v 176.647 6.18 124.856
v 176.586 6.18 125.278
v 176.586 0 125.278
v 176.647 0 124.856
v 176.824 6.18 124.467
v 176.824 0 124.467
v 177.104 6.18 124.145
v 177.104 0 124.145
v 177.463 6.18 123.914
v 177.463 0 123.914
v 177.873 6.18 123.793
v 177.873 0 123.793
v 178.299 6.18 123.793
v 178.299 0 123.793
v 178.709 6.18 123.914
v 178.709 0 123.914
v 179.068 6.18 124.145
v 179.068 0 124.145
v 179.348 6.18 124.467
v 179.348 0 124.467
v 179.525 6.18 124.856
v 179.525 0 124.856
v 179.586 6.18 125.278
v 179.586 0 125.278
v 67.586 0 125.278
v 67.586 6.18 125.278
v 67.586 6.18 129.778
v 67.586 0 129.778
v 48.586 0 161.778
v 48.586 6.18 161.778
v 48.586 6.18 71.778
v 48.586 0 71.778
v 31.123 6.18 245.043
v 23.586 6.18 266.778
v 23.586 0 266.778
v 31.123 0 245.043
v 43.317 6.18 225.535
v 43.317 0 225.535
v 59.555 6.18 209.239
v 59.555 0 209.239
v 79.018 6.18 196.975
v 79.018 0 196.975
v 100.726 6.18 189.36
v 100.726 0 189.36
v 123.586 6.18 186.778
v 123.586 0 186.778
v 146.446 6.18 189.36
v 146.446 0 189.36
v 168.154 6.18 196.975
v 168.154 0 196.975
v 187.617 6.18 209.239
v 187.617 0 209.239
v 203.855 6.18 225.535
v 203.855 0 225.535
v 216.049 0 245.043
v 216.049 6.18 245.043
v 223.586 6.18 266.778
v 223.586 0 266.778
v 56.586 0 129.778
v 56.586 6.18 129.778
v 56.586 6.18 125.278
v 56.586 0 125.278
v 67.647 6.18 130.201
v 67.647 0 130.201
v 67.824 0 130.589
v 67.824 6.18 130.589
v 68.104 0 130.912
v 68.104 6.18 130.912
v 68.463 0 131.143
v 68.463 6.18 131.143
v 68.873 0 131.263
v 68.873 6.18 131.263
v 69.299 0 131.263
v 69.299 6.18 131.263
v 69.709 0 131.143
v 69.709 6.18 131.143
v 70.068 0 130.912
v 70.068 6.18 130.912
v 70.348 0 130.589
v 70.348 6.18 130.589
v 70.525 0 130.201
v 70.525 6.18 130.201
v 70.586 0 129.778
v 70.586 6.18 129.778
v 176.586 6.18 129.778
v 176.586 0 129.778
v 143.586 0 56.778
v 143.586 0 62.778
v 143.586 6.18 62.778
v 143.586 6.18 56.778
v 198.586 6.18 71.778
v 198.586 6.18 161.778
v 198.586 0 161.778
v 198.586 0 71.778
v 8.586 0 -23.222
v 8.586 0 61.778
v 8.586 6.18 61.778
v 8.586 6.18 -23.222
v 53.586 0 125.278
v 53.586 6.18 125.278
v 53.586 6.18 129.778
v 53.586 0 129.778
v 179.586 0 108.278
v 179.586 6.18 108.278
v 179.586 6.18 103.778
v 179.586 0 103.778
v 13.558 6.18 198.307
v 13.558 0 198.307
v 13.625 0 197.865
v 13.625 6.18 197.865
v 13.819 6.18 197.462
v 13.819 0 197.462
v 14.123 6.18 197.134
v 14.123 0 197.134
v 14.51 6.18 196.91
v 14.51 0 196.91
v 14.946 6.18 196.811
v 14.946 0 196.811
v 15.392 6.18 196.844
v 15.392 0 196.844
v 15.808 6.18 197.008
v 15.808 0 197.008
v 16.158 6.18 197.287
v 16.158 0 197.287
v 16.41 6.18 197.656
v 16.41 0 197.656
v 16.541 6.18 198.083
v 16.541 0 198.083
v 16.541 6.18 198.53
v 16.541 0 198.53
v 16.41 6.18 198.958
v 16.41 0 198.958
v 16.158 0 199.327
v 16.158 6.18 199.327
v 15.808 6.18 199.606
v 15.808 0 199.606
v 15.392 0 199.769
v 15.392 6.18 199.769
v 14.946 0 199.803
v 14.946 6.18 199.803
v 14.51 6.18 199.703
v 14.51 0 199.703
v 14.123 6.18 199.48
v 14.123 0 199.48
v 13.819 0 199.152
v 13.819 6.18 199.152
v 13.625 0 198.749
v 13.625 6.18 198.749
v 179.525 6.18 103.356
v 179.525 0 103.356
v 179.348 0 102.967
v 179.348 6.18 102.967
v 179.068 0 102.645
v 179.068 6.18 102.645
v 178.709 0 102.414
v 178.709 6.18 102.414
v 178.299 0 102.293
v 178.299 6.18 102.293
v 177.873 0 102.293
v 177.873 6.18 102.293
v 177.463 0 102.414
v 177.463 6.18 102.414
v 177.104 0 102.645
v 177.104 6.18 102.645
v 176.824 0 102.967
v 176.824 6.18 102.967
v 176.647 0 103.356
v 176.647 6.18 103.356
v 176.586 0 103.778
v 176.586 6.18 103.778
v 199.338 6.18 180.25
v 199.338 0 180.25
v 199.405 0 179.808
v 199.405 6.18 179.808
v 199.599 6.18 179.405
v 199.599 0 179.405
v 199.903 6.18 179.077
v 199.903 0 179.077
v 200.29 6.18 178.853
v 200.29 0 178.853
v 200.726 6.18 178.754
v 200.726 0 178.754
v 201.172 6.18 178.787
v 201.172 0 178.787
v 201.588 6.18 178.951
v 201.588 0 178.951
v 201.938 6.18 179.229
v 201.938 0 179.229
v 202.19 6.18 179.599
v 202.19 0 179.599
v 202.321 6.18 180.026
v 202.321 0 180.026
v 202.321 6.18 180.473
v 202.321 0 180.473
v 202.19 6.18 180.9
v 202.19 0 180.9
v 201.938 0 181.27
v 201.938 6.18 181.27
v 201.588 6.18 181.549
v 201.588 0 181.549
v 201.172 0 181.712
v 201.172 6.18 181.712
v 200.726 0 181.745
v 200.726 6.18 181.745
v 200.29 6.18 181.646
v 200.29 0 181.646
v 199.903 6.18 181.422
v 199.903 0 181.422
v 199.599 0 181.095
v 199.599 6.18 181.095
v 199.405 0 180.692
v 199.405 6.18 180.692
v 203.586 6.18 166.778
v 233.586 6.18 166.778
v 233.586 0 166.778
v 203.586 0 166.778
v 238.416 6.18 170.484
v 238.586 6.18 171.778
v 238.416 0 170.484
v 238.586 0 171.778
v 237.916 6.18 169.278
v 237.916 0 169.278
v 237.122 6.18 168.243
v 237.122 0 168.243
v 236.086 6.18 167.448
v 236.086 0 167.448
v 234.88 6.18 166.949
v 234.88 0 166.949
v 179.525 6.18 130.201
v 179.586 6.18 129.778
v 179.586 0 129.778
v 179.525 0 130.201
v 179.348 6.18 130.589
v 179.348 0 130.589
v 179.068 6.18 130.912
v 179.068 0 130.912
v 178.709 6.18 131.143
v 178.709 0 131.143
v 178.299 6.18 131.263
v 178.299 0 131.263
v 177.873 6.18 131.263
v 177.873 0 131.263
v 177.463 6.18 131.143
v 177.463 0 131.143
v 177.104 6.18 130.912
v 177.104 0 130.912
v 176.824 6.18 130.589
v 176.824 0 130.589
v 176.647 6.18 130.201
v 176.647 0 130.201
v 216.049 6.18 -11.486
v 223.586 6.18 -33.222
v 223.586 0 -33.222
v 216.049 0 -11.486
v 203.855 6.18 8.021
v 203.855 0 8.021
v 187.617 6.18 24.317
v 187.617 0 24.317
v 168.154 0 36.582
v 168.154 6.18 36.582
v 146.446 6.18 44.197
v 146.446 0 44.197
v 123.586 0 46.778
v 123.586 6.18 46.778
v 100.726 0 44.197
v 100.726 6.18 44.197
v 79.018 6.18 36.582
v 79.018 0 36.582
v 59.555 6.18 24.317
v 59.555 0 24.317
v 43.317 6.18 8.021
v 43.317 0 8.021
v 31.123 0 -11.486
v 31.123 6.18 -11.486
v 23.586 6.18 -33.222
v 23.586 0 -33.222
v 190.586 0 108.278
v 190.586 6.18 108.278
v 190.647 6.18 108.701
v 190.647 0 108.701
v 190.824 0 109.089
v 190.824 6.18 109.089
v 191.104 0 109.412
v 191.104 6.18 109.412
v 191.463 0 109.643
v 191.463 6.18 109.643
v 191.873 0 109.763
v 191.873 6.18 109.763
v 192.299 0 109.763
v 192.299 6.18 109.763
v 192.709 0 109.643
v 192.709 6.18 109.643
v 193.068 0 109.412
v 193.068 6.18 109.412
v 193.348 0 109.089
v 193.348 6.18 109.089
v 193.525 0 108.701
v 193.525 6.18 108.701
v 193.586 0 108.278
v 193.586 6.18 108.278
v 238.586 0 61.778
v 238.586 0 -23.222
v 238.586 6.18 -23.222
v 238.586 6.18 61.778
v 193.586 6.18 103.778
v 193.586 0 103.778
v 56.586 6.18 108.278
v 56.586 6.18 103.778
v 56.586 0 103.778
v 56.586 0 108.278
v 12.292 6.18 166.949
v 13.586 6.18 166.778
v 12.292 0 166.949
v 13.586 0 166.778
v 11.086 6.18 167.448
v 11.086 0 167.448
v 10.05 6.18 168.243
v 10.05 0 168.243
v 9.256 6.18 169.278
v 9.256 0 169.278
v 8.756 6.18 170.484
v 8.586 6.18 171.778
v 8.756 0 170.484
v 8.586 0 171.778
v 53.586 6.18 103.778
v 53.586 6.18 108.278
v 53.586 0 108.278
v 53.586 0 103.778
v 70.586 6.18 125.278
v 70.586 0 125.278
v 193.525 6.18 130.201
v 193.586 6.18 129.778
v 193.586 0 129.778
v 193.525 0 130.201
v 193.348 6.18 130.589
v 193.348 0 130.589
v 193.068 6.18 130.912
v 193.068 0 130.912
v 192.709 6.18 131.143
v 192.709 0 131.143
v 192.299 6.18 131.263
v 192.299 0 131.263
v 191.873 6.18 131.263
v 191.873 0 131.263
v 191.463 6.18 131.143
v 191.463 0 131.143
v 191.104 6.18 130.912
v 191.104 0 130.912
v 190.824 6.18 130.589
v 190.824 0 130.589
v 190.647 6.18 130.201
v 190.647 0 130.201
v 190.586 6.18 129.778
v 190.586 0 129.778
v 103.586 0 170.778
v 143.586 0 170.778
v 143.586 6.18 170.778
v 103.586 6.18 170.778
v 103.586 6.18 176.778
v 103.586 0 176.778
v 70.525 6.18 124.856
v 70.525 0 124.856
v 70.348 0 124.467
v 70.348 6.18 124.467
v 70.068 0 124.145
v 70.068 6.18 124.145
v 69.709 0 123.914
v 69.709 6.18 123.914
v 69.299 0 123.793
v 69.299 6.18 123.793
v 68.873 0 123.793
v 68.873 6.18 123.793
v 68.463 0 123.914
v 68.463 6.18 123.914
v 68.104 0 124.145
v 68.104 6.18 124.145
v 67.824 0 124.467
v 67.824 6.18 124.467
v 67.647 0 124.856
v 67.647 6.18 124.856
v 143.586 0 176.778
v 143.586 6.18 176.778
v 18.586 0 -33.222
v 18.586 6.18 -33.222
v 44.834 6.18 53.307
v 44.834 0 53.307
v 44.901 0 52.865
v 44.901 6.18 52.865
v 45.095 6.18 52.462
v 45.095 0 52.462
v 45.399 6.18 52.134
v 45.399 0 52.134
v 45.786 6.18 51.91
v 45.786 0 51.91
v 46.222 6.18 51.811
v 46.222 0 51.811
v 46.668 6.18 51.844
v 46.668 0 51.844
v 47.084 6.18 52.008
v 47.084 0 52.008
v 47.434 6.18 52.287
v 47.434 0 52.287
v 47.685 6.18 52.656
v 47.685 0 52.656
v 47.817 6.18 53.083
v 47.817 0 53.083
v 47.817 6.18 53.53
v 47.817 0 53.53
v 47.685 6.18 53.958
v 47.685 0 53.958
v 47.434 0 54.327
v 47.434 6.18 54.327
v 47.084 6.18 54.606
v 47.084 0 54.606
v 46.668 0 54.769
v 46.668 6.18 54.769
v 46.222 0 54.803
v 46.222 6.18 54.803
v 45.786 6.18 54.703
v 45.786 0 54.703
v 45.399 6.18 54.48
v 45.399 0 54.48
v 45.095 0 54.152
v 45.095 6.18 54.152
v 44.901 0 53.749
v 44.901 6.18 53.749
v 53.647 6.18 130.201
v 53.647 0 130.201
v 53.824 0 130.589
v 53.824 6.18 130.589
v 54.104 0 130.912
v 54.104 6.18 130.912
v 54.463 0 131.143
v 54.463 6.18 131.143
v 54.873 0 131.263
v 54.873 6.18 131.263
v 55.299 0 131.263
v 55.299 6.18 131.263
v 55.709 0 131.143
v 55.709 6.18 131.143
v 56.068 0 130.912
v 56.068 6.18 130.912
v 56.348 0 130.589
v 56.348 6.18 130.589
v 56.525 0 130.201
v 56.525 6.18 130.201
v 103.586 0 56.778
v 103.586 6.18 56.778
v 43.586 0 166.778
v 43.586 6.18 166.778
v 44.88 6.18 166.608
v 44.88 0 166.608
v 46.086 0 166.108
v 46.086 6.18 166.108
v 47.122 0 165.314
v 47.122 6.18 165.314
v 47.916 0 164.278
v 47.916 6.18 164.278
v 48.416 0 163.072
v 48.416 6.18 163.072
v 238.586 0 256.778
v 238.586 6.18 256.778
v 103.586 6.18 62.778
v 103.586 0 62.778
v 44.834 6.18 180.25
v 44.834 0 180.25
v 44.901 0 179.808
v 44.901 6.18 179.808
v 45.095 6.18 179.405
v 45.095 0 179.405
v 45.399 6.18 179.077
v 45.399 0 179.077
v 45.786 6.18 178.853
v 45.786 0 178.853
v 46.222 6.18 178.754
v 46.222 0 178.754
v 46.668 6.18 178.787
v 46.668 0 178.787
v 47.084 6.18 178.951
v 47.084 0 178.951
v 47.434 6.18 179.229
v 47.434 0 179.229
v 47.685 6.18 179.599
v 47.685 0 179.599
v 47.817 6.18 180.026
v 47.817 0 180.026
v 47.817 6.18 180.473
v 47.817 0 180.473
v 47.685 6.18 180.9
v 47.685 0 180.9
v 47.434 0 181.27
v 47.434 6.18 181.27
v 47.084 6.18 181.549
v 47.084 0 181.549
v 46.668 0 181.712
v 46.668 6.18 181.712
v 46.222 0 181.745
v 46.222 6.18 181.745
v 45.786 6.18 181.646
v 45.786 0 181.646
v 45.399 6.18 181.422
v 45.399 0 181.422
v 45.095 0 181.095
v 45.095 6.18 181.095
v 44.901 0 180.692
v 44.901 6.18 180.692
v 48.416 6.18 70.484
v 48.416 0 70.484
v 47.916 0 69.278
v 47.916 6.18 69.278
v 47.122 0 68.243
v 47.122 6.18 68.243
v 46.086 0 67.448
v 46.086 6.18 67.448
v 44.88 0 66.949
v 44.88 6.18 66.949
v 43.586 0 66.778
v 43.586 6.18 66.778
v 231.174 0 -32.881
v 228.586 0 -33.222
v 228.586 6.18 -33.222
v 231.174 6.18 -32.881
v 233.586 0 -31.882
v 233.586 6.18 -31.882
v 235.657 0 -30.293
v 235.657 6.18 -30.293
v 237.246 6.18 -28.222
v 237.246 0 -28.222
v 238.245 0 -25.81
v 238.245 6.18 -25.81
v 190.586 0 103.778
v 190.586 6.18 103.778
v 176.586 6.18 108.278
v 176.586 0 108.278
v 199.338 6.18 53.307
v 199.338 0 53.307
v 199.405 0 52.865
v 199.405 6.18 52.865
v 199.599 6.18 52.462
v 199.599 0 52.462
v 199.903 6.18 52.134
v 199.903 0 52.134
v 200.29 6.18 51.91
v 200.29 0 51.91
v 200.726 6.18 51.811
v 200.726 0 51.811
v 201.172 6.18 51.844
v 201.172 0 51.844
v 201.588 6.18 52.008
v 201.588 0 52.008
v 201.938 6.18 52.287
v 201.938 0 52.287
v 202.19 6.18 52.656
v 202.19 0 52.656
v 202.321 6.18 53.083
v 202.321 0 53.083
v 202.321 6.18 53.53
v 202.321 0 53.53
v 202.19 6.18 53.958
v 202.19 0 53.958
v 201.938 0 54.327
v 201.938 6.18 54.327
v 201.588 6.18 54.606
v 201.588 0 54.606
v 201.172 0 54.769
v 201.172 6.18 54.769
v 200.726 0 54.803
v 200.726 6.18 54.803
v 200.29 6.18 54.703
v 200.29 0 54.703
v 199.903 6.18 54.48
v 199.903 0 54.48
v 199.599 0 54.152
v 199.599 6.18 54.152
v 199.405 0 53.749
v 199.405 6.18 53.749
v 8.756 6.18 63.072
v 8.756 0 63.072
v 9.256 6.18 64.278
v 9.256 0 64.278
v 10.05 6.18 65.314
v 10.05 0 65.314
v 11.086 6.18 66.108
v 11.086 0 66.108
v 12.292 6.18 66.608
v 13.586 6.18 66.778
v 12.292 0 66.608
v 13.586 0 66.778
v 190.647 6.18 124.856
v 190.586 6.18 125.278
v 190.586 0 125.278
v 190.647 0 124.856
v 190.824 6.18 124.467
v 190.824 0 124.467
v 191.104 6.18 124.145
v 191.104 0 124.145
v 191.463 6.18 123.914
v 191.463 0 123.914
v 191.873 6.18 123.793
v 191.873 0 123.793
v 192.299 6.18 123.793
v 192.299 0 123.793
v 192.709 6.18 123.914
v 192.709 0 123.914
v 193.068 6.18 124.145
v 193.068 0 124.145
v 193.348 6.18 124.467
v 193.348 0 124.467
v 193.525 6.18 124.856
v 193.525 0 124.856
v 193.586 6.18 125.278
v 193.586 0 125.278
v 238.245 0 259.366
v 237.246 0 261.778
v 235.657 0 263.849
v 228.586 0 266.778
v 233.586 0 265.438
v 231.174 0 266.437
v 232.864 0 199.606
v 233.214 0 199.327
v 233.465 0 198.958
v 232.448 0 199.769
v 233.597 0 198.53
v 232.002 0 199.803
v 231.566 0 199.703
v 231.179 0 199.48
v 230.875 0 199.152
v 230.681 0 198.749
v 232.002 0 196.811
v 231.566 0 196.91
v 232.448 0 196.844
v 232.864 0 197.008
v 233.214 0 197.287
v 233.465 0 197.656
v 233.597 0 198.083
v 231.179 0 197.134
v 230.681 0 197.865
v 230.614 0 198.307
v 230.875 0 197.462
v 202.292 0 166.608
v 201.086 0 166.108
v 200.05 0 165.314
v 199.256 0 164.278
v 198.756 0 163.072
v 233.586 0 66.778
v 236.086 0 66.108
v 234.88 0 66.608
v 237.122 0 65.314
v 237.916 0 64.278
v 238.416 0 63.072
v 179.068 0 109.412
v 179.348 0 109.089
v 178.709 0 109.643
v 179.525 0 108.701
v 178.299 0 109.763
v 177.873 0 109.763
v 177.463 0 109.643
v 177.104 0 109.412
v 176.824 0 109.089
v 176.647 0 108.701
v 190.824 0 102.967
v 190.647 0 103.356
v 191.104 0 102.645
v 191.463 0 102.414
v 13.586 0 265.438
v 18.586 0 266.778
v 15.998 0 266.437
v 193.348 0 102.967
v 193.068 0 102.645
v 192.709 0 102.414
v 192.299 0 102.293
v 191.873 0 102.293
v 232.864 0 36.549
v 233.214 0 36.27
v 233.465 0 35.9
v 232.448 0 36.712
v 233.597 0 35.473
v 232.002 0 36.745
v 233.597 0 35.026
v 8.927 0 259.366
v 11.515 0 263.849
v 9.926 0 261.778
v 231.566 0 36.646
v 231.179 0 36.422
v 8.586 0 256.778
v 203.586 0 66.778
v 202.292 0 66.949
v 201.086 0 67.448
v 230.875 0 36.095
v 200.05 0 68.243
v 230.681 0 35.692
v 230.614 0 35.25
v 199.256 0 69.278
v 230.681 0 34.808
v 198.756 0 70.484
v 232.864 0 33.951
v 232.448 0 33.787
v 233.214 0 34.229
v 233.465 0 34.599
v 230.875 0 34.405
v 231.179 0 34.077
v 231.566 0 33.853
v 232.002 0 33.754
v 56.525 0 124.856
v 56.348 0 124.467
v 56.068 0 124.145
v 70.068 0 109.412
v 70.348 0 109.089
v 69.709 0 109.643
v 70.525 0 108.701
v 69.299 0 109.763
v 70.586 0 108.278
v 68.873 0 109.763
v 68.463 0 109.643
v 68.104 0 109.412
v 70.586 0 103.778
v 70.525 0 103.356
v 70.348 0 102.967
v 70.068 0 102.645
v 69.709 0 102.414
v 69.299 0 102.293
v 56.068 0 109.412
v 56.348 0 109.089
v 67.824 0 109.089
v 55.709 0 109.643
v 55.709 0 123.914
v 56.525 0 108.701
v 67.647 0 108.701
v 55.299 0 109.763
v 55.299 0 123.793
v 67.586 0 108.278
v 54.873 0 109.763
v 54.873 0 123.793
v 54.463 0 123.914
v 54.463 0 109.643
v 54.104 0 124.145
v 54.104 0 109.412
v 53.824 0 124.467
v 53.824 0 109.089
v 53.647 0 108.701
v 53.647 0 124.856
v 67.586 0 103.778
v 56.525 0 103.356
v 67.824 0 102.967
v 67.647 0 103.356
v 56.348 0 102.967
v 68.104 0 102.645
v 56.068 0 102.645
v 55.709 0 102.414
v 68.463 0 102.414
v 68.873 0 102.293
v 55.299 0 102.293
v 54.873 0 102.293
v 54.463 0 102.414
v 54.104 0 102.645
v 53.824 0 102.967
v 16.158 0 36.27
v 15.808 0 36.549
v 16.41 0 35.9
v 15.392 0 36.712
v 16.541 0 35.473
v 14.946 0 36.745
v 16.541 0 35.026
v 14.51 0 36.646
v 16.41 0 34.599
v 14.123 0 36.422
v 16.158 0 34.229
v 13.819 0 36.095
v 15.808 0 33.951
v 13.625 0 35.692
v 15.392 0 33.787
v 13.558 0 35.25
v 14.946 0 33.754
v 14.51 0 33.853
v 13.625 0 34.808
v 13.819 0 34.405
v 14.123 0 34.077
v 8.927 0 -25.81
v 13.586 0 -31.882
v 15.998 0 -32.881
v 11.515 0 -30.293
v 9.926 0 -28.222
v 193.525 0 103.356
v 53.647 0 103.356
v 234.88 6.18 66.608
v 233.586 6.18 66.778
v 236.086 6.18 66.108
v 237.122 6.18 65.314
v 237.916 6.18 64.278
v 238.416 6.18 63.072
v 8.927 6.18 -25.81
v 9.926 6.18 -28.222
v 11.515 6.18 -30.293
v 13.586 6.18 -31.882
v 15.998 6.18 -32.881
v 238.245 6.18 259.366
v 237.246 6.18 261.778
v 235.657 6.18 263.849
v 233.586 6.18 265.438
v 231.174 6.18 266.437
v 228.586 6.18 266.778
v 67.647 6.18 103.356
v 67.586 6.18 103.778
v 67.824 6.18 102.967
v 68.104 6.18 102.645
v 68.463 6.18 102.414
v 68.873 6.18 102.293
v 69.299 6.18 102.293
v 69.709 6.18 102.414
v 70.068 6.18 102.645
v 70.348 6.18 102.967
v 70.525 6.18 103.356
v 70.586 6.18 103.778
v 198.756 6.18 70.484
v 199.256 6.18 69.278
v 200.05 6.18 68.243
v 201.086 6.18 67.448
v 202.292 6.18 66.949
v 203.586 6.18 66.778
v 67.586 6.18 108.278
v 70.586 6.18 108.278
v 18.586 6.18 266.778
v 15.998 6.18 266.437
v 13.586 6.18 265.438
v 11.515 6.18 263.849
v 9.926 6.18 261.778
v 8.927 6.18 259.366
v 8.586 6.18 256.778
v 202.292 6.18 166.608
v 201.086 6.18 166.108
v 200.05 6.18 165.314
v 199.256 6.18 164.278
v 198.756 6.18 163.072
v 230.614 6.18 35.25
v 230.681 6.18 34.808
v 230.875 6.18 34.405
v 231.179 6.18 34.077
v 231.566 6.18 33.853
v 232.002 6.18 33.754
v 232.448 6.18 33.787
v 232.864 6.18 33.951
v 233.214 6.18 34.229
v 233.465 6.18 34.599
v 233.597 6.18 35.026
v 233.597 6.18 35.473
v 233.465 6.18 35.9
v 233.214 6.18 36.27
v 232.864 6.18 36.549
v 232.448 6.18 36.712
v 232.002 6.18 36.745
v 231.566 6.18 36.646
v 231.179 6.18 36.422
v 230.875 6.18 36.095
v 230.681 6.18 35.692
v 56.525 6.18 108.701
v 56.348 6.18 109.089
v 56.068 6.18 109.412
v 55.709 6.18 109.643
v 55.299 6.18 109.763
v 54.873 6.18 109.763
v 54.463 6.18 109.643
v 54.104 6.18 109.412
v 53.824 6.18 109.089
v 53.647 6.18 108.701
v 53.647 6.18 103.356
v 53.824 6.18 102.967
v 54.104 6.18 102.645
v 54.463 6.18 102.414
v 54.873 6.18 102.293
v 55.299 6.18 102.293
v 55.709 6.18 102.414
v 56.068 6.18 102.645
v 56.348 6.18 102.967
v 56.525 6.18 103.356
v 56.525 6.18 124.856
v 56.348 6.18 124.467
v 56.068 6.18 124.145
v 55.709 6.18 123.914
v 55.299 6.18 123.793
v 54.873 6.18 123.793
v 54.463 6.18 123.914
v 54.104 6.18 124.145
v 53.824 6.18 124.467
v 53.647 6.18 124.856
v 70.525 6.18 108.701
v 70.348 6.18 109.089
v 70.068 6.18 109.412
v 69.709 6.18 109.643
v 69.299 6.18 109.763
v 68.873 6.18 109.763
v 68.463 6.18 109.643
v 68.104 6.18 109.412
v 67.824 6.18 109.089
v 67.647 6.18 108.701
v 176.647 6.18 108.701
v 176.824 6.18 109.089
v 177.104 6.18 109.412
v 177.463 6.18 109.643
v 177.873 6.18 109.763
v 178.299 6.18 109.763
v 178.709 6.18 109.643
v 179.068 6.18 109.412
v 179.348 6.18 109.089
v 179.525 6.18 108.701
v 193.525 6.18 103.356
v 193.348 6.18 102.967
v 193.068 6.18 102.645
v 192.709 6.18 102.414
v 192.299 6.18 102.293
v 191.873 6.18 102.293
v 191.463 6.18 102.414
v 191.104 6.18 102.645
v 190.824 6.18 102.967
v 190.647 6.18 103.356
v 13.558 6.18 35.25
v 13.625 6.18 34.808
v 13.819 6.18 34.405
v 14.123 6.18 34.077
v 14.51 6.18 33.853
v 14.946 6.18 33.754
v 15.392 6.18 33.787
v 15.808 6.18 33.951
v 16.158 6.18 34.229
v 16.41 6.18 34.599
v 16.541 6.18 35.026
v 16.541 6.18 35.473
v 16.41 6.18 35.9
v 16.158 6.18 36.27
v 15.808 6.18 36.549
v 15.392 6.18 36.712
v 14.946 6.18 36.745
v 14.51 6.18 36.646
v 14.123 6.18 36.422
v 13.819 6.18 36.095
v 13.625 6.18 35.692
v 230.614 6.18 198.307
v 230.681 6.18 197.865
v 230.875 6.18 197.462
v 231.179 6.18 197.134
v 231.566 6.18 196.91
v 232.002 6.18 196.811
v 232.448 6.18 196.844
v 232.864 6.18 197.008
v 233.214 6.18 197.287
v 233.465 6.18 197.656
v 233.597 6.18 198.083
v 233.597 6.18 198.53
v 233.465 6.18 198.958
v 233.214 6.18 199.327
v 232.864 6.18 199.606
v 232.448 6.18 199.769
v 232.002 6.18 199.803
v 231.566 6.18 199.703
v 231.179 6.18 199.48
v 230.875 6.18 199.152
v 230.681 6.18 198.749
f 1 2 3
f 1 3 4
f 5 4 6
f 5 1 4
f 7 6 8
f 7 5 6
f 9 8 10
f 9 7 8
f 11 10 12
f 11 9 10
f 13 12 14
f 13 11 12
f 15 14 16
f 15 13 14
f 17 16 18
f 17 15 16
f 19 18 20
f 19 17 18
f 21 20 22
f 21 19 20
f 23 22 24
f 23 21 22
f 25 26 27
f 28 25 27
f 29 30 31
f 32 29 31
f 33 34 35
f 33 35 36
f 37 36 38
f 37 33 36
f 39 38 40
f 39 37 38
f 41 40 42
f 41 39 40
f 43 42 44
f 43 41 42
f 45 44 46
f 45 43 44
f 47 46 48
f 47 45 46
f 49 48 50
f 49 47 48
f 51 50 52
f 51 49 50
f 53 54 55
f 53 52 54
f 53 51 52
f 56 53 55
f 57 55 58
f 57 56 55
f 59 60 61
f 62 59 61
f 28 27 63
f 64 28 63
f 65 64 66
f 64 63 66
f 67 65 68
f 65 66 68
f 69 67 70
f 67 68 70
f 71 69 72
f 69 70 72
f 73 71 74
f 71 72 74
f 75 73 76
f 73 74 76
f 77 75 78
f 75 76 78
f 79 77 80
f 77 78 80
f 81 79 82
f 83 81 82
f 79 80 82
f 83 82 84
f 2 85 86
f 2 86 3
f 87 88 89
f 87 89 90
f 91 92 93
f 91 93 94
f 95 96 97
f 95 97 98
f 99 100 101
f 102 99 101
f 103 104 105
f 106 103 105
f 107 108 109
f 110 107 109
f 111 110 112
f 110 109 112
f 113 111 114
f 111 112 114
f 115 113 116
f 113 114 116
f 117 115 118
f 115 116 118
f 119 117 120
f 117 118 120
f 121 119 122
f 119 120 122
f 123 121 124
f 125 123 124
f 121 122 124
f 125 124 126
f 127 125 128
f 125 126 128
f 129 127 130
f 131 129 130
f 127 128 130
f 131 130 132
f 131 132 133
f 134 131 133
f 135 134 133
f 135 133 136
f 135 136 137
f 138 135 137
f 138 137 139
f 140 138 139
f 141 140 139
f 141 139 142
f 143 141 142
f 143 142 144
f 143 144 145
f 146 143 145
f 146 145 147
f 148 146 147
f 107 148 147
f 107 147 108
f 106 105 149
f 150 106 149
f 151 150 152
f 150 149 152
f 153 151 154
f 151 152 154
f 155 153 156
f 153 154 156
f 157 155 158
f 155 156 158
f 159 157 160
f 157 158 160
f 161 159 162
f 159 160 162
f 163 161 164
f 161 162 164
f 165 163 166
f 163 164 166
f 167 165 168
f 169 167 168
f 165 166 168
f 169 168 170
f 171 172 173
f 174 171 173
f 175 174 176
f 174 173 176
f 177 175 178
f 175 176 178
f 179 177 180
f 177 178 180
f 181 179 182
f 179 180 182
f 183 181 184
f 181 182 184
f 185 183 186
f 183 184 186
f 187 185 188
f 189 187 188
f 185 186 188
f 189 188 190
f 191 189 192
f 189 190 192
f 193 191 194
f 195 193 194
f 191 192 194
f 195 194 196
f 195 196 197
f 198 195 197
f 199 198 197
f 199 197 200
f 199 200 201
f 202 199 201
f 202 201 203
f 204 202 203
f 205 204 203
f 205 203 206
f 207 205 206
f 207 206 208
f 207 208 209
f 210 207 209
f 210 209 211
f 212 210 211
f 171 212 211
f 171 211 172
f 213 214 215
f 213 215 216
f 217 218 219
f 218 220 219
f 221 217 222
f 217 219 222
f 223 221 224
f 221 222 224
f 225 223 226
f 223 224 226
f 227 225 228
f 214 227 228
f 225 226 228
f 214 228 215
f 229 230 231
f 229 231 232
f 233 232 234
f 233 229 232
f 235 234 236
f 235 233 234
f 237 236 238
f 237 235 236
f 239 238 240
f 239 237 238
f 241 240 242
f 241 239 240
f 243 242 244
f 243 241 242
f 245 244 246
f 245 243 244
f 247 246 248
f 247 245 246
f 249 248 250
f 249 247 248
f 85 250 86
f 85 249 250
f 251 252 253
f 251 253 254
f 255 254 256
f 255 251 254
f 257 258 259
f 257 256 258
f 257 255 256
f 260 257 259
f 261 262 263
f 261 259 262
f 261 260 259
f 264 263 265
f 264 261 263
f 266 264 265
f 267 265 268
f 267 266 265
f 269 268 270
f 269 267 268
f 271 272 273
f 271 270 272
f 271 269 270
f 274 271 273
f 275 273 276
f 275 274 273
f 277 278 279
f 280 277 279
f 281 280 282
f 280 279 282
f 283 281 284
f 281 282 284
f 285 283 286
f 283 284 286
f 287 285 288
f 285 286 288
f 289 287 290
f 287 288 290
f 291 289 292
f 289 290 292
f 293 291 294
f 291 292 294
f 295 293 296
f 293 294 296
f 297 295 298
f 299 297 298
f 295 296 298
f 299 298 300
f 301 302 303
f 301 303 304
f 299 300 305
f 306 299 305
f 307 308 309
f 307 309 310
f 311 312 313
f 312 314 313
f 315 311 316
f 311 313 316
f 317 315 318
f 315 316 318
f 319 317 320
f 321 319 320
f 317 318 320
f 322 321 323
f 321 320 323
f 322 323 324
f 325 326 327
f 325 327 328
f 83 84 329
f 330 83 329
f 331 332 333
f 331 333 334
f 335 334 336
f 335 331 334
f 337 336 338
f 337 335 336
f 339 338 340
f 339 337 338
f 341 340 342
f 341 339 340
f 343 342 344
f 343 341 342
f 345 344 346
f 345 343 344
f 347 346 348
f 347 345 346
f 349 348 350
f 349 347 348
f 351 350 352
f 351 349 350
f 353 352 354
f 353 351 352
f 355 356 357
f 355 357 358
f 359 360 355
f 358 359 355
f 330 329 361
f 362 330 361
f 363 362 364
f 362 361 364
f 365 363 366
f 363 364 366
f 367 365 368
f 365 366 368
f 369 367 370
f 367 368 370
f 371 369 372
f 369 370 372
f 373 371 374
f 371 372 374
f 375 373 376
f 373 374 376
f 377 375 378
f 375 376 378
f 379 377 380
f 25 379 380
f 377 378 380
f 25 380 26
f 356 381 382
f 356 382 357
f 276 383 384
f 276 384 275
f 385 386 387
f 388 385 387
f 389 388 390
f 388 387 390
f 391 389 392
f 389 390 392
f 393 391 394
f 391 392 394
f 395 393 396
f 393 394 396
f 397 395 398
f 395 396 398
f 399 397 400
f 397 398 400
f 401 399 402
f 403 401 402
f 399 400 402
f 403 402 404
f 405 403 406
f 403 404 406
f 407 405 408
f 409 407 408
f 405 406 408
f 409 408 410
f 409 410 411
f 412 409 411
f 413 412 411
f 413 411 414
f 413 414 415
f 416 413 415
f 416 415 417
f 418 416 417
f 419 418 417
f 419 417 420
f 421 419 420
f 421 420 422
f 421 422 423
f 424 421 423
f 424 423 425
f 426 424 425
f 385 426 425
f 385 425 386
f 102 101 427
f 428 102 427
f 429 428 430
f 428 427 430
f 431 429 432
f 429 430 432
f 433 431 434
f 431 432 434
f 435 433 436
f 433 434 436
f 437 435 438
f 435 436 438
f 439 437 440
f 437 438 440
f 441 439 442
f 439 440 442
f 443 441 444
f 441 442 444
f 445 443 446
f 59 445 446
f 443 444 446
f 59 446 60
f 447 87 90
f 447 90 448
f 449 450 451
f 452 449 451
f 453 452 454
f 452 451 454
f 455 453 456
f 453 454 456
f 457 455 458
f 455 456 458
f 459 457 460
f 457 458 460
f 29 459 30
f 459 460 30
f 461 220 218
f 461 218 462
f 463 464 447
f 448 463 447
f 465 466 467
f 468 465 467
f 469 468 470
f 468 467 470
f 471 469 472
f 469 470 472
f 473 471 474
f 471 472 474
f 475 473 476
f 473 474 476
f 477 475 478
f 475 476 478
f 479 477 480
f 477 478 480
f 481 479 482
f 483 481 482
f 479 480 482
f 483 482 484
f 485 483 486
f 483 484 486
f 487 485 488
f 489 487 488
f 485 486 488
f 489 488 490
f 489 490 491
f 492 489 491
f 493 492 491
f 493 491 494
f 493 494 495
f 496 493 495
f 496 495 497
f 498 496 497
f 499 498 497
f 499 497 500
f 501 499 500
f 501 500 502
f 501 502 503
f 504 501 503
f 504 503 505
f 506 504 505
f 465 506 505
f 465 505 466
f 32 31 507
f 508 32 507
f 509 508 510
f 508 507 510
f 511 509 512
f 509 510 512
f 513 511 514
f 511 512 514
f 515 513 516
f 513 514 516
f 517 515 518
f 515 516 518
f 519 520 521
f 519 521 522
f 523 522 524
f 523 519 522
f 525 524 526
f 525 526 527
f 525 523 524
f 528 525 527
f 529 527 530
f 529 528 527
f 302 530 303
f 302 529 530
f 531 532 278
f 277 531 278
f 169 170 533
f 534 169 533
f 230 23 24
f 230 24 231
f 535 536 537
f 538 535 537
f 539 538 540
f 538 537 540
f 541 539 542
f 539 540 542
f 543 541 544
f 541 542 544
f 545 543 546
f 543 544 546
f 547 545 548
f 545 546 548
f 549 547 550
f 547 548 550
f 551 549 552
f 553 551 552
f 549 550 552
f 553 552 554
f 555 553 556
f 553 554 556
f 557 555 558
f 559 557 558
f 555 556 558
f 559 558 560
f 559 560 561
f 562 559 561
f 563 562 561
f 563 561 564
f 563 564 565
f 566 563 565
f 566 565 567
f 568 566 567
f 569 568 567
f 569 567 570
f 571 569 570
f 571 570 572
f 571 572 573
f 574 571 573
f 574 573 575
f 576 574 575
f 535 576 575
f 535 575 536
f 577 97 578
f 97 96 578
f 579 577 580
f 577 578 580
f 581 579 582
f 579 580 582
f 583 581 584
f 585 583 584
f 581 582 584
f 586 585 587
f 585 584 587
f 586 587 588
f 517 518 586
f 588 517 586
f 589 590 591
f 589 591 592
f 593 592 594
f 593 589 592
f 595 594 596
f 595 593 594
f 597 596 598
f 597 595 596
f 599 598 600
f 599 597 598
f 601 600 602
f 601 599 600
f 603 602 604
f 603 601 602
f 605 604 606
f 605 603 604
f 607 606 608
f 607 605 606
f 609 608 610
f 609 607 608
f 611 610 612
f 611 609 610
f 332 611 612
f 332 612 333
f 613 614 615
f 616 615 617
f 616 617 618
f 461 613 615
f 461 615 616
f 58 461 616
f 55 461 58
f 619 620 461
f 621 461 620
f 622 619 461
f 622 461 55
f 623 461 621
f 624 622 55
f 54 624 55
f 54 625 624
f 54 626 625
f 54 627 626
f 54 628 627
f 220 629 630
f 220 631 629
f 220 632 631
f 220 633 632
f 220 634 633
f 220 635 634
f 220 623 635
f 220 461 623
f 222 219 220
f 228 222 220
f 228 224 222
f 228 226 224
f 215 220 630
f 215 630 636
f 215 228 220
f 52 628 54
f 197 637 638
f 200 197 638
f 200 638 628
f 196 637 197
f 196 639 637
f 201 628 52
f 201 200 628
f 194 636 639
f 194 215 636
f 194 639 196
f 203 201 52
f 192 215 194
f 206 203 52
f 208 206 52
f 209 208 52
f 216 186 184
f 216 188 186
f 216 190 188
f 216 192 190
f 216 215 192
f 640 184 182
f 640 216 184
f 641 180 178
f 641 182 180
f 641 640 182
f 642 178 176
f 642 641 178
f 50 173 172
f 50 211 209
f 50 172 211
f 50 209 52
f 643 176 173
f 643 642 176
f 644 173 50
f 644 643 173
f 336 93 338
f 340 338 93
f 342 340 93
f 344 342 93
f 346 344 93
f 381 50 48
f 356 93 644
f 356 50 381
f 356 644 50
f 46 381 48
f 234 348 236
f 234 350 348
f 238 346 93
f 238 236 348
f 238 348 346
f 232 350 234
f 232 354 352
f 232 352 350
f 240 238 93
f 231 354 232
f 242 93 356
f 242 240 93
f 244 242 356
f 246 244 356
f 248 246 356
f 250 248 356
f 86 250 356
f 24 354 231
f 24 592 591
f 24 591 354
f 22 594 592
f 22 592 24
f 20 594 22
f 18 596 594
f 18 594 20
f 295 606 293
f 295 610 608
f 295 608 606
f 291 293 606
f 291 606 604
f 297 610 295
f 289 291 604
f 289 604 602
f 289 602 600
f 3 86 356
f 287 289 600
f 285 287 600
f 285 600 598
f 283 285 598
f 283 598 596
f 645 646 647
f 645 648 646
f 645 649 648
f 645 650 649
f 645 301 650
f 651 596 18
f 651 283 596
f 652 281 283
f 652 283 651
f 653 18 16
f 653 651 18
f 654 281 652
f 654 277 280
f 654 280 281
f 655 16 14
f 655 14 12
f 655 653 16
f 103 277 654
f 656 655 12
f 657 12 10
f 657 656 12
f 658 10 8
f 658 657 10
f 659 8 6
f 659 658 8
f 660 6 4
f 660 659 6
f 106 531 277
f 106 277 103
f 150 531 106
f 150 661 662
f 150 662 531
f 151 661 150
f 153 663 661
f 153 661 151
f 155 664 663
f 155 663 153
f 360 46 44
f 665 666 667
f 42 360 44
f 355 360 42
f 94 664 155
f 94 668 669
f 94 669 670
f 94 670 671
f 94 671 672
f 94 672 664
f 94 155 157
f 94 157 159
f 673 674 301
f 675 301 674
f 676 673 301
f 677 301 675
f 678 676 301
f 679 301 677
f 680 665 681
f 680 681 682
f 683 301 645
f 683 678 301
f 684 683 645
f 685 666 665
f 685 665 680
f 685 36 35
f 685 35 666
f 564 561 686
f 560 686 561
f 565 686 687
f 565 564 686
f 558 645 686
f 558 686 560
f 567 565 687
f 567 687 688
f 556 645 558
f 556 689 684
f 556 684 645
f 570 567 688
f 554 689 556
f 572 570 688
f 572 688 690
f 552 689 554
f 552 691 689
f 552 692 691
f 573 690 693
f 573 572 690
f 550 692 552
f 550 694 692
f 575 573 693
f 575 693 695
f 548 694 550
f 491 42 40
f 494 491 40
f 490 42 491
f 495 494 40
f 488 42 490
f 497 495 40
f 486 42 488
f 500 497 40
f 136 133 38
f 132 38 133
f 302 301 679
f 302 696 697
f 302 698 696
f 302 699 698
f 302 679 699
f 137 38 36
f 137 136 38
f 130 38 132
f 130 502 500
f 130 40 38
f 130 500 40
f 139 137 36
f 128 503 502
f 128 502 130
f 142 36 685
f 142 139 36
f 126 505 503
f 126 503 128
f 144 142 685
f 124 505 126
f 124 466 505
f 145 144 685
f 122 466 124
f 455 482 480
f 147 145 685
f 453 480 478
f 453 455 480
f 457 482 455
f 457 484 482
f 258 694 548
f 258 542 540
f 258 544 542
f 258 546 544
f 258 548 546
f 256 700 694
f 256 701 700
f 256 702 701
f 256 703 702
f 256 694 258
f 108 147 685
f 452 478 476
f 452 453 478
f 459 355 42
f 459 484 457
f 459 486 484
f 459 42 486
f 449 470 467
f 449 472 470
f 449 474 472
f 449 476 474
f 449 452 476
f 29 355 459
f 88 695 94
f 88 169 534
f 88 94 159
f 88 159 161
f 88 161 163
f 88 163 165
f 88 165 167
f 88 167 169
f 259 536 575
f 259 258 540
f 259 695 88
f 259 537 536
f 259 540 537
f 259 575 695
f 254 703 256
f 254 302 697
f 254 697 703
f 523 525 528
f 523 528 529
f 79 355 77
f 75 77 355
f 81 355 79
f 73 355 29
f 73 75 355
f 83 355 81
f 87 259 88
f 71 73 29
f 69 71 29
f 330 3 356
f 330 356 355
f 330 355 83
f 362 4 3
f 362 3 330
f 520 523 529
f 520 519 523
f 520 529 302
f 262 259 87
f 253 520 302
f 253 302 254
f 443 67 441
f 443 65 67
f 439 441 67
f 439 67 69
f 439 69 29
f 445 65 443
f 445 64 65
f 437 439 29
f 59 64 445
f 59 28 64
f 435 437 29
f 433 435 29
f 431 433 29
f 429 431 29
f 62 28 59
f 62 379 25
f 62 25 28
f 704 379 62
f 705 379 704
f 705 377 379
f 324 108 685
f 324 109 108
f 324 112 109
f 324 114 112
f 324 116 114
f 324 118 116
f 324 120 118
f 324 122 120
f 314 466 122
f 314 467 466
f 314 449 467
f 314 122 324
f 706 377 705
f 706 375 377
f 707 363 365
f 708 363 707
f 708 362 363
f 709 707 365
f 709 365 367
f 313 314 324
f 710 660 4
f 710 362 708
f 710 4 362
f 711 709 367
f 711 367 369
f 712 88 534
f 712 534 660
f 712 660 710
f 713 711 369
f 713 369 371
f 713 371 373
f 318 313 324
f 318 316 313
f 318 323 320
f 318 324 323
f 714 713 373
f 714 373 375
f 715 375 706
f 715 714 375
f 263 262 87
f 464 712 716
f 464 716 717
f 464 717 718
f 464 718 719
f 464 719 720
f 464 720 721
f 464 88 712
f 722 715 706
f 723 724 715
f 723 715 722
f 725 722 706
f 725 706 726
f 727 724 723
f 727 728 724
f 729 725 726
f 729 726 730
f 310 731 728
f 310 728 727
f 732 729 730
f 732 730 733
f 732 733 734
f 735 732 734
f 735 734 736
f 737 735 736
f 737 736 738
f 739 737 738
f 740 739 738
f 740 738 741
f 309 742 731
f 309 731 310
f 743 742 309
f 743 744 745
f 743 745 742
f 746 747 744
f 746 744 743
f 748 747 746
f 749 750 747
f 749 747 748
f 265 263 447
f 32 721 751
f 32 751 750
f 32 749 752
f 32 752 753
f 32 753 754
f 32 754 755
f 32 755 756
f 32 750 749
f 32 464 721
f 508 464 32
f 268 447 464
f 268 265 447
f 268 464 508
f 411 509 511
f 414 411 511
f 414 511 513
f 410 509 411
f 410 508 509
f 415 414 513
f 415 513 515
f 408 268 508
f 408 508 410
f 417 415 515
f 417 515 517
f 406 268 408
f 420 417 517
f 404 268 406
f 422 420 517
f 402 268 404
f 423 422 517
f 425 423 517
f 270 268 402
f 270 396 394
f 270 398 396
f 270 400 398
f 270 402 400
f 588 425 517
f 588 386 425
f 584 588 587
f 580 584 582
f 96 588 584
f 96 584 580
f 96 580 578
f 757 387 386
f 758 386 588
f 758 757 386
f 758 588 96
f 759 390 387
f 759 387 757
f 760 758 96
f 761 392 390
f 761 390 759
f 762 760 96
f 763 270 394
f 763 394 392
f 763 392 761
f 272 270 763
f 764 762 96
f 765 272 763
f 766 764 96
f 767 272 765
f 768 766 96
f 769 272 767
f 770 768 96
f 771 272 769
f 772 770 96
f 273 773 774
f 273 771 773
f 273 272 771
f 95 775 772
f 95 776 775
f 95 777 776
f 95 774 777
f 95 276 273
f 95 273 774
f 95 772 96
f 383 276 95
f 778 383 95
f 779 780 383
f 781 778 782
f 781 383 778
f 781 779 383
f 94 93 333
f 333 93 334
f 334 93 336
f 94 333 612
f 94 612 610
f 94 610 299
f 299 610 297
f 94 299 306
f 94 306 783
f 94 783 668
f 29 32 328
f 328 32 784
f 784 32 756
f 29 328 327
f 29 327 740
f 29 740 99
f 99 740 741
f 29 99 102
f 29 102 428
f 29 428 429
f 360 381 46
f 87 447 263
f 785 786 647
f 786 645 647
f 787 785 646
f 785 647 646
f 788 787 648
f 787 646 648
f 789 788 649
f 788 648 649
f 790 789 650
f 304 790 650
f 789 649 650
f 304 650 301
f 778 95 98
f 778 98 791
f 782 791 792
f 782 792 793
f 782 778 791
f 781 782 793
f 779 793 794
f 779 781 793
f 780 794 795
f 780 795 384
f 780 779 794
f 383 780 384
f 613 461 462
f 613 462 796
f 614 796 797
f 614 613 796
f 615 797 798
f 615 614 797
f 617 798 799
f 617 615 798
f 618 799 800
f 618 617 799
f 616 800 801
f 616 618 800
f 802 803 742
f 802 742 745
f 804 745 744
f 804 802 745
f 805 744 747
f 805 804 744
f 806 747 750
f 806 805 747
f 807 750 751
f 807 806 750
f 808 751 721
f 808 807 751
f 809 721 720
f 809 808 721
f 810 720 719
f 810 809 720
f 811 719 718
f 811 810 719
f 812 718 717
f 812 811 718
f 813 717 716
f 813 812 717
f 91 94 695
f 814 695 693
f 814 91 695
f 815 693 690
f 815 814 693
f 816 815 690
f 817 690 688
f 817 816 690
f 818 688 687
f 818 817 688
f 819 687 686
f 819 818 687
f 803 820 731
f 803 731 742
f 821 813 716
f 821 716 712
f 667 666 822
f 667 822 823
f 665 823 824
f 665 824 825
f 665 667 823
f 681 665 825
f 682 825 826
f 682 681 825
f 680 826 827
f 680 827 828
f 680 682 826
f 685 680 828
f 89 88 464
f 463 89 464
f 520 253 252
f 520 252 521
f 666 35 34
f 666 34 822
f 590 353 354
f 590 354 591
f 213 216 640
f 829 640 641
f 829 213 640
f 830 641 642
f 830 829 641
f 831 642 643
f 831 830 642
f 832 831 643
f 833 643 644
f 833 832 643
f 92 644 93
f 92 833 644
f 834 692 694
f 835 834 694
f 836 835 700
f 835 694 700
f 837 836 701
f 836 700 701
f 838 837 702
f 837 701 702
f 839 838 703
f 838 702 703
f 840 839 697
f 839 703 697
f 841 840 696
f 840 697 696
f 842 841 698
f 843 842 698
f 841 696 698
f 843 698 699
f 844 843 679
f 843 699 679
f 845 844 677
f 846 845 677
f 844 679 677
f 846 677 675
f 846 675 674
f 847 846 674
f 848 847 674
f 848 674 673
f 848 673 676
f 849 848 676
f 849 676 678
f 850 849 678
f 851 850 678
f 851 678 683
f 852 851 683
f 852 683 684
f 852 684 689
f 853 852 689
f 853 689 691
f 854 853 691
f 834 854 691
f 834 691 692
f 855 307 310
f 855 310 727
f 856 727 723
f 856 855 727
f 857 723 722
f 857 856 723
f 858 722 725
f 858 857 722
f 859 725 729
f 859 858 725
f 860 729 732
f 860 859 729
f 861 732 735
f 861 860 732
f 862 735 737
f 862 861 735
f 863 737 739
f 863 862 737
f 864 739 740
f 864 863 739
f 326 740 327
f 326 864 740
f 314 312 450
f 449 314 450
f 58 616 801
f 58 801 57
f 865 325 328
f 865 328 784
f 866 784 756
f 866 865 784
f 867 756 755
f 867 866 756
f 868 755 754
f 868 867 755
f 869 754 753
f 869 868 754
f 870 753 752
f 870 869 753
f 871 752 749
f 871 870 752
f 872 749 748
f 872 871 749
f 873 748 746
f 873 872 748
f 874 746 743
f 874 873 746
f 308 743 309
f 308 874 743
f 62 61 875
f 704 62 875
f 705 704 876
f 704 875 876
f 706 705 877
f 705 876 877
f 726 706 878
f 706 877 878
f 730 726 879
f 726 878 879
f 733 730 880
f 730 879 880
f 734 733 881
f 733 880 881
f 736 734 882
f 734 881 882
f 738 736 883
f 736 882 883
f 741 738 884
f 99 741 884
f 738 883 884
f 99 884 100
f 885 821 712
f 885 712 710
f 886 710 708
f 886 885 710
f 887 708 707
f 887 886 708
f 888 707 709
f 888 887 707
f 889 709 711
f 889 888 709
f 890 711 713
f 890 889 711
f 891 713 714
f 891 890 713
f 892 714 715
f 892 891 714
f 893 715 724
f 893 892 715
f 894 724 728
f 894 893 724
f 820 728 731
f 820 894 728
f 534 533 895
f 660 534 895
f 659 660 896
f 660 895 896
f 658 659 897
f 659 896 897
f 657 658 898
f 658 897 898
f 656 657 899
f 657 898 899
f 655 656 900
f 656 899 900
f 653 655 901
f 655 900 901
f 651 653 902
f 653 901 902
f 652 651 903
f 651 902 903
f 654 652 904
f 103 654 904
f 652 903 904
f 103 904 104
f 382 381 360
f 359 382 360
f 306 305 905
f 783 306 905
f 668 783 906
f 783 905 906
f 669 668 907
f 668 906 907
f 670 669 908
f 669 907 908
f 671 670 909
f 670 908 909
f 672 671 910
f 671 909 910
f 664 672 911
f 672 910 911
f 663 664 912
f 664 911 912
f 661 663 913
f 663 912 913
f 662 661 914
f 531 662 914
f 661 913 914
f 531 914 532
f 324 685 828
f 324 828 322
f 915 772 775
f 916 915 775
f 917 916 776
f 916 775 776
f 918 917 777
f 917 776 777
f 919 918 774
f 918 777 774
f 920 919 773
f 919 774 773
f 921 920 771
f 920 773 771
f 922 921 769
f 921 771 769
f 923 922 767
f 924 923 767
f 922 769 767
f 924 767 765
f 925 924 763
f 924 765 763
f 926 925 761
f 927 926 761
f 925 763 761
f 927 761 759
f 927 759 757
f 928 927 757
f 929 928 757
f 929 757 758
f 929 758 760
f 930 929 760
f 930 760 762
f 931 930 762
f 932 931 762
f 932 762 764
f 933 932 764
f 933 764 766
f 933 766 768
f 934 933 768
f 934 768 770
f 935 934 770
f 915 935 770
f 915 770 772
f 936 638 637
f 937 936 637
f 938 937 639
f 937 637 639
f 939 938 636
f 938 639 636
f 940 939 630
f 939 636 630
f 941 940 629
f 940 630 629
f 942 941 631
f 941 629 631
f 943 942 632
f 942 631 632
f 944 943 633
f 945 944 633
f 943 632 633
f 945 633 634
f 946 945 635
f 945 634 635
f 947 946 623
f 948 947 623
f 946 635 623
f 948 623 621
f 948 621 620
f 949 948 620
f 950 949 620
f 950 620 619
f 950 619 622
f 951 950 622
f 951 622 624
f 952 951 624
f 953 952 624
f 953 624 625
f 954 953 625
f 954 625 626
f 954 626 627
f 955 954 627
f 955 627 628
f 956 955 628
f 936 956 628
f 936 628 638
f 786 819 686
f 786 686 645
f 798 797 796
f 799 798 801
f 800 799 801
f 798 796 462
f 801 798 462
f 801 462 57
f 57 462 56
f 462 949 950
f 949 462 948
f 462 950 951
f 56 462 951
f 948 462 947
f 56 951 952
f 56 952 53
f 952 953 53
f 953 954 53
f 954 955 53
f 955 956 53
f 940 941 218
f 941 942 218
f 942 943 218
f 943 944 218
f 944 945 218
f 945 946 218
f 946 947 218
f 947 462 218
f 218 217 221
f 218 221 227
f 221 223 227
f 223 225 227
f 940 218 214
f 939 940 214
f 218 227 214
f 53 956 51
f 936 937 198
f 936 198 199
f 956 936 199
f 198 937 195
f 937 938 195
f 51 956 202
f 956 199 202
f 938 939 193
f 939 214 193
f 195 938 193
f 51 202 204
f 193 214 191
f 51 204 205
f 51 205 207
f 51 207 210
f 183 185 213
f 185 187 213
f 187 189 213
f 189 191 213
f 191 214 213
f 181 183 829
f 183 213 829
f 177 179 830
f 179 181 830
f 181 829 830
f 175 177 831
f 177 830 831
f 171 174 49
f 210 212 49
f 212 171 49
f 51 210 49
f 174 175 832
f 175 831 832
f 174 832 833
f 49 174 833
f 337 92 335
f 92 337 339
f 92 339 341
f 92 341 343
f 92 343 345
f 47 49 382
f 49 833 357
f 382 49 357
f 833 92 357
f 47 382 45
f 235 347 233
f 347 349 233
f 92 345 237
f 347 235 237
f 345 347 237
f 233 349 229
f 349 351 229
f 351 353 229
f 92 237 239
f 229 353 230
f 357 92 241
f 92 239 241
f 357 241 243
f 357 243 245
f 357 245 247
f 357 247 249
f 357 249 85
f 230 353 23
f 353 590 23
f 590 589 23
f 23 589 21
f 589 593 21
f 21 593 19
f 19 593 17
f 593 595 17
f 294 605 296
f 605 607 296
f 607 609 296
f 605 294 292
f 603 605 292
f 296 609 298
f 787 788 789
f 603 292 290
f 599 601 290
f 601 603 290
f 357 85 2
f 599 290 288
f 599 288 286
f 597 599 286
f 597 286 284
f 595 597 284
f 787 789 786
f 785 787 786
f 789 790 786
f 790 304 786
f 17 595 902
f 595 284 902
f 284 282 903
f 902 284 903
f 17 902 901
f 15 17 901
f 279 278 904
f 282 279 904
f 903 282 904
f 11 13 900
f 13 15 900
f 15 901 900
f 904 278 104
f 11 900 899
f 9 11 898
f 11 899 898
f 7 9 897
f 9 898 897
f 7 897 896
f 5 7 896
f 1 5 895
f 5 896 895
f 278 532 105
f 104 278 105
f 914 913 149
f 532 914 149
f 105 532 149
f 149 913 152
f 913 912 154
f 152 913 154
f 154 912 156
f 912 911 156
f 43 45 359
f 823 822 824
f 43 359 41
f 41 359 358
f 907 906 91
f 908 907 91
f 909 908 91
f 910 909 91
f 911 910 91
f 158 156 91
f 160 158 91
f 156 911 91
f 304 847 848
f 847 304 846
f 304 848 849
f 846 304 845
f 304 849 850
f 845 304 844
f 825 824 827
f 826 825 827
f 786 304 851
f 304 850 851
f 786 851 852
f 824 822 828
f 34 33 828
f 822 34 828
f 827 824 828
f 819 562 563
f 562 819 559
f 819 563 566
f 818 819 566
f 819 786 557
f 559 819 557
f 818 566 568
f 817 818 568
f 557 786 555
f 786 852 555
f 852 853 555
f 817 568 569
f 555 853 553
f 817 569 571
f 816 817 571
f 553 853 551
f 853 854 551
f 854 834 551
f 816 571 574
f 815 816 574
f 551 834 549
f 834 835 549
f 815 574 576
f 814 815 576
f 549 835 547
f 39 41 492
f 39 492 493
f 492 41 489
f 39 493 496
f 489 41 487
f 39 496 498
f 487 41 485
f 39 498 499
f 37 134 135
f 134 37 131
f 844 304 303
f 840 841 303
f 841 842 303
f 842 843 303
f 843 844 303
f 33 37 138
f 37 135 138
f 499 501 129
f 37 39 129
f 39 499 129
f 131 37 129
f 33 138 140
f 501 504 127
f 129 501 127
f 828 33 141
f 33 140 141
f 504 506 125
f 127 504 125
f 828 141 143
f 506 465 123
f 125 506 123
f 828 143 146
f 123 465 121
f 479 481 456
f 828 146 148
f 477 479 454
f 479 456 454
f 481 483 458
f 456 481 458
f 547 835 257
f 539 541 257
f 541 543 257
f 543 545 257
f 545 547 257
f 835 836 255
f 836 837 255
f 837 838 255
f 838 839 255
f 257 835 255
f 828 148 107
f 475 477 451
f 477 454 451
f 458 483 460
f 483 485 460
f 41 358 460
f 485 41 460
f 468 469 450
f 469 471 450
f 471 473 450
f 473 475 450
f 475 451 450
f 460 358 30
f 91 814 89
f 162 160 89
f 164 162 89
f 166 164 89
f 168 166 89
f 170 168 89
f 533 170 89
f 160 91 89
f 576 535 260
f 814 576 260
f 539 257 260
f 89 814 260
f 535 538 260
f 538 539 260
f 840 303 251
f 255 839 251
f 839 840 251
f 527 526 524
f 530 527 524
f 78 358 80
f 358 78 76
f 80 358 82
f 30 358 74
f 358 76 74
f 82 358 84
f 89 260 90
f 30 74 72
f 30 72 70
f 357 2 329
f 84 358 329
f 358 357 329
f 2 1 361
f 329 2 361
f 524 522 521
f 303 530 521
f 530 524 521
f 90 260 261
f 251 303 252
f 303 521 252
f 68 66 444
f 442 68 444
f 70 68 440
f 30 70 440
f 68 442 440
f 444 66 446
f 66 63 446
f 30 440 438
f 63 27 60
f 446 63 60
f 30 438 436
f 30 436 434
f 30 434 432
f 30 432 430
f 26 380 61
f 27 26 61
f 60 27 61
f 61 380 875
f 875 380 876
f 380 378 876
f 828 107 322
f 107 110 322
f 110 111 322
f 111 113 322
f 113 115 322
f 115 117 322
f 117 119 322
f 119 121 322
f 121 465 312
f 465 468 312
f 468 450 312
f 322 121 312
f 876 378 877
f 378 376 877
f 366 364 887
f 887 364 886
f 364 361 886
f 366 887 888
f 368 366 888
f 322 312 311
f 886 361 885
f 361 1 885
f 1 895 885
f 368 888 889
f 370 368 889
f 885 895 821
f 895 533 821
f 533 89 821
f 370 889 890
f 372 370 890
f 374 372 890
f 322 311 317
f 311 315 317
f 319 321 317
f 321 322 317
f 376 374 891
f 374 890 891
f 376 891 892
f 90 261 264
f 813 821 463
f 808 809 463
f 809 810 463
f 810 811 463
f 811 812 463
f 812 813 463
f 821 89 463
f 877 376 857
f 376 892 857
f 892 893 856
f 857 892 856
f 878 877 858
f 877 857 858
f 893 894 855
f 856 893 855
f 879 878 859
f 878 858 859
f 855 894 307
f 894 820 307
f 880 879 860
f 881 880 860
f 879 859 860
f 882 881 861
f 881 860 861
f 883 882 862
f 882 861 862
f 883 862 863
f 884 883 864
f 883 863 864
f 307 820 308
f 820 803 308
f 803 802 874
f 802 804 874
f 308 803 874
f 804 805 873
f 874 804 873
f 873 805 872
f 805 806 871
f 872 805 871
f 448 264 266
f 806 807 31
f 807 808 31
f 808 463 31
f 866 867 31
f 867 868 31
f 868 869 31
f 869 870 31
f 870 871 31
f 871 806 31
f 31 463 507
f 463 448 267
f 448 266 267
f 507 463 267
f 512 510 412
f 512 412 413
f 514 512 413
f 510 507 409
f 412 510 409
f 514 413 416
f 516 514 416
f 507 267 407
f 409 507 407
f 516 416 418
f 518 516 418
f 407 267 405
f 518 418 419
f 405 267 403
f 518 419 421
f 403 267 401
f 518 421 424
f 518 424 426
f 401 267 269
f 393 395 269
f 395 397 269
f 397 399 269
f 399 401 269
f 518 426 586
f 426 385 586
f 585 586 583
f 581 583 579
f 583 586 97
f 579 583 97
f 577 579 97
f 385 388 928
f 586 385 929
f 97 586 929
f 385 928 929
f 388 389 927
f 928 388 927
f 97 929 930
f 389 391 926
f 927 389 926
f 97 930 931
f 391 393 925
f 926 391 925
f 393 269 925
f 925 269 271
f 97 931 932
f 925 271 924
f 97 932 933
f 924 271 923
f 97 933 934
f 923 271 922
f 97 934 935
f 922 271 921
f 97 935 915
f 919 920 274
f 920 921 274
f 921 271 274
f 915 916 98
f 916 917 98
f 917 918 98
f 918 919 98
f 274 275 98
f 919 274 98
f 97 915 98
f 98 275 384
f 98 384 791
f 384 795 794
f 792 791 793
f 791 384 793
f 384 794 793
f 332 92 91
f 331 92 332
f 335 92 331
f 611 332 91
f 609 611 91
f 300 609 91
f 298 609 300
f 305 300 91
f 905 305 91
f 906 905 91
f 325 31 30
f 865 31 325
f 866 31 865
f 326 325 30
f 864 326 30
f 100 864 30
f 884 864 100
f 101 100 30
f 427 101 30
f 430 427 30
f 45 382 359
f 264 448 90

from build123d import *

# Parameters (mm, degrees)
EXTRUDE_1_DEPTH          = 6.18
CUT_EXTRUDE_1_DEPTH      = 7.18
FILLET_2_R               = 5
FILLET_3_R               = 5
FILLET_4_R               = 5
FILLET_5_R               = 5
SKETCH_4_W               = 40
SKETCH_4_H               = 6
SKETCH_4_R               = 1.5
CUT_EXTRUDE_2_DEPTH      = 7.18
CUT_EXTRUDE_9_DEPTH      = 1
CUT_EXTRUDE_9_DEPTH_BACK = 7.18


with BuildPart() as part:
    # 草图1 → 凸台-拉伸1 (new body)
    with BuildSketch(Plane(origin=(0, 0, 0), x_dir=(1, 0, 0), z_dir=(0, 1, 0))):
        with BuildLine():
            Line((18.586012984, 33.22179039), (228.586012984, 33.22179039))
            ThreePointArc((228.586012984, 33.22179039), (235.657080796, 30.292858202), (238.586012984, 23.22179039))
            Line((238.586012984, 23.22179039), (238.586012984, -256.77820961))
            ThreePointArc((238.586012984, -256.77820961), (235.657080796, -263.849277422), (228.586012984, -266.77820961))
            Line((228.586012984, -266.77820961), (18.586012984, -266.77820961))
            ThreePointArc((18.586012984, -266.77820961), (11.514945172, -263.849277422), (8.586012984, -256.77820961))
            Line((8.586012984, -256.77820961), (8.586012984, 23.22179039))
            ThreePointArc((8.586012984, 23.22179039), (11.514945172, 30.292858202), (18.586012984, 33.22179039))
        make_face()
    extrude(amount=EXTRUDE_1_DEPTH)

    # 草图2 → 切除-拉伸1 (cut, through all)
    with BuildSketch(Plane(origin=(0, 6.18, 0), x_dir=(1, 0, 0), z_dir=(0, 1, 0))):
        with BuildLine():
            Line((48.586012984, -161.77820961), (48.586012984, -71.77820961))
            ThreePointArc((48.586012984, -71.77820961), (47.12154689, -68.242675704), (43.586012984, -66.77820961))
            Line((43.586012984, -66.77820961), (8.586012984, -66.77820961))
            Line((8.586012984, -66.77820961), (8.586012984, -166.77820961))
            Line((8.586012984, -166.77820961), (43.586012984, -166.77820961))
            ThreePointArc((43.586012984, -166.77820961), (47.12154689, -165.313743516), (48.586012984, -161.77820961))
        make_face()
        with BuildLine():
            Line((56.586012984, -103.77820961), (56.586012984, -108.27820961))
            ThreePointArc((56.586012984, -108.27820961), (55.086012984, -109.77820961), (53.586012984, -108.27820961))
            Line((53.586012984, -108.27820961), (53.586012984, -103.77820961))
            ThreePointArc((53.586012984, -103.77820961), (55.086012984, -102.27820961), (56.586012984, -103.77820961))
        make_face()
        with BuildLine():
            Line((70.586012984, -103.77820961), (70.586012984, -108.27820961))
            ThreePointArc((70.586012984, -108.27820961), (69.086012984, -109.77820961), (67.586012984, -108.27820961))
            Line((67.586012984, -108.27820961), (67.586012984, -103.77820961))
            ThreePointArc((67.586012984, -103.77820961), (69.086012984, -102.27820961), (70.586012984, -103.77820961))
        make_face()
        with BuildLine():
            Line((70.586012984, -129.77820961), (70.586012984, -125.27820961))
            ThreePointArc((70.586012984, -125.27820961), (69.086012984, -123.77820961), (67.586012984, -125.27820961))
            Line((67.586012984, -125.27820961), (67.586012984, -129.77820961))
            ThreePointArc((67.586012984, -129.77820961), (69.086012984, -131.27820961), (70.586012984, -129.77820961))
        make_face()
        with BuildLine():
            Line((56.586012984, -129.77820961), (56.586012984, -125.27820961))
            ThreePointArc((56.586012984, -125.27820961), (55.086012984, -123.77820961), (53.586012984, -125.27820961))
            Line((53.586012984, -125.27820961), (53.586012984, -129.77820961))
            ThreePointArc((53.586012984, -129.77820961), (55.086012984, -131.27820961), (56.586012984, -129.77820961))
        make_face()
        with BuildLine():
            Line((176.586012984, -129.77820961), (176.586012984, -125.27820961))
            ThreePointArc((176.586012984, -125.27820961), (178.086012984, -123.77820961), (179.586012984, -125.27820961))
            Line((179.586012984, -125.27820961), (179.586012984, -129.77820961))
            ThreePointArc((179.586012984, -129.77820961), (178.086012984, -131.27820961), (176.586012984, -129.77820961))
        make_face()
        with BuildLine():
            Line((190.586012984, -129.77820961), (190.586012984, -125.27820961))
            ThreePointArc((190.586012984, -125.27820961), (192.086012984, -123.77820961), (193.586012984, -125.27820961))
            Line((193.586012984, -125.27820961), (193.586012984, -129.77820961))
            ThreePointArc((193.586012984, -129.77820961), (192.086012984, -131.27820961), (190.586012984, -129.77820961))
        make_face()
        with BuildLine():
            Line((190.586012984, -103.77820961), (190.586012984, -108.27820961))
            ThreePointArc((190.586012984, -108.27820961), (192.086012984, -109.77820961), (193.586012984, -108.27820961))
            Line((193.586012984, -108.27820961), (193.586012984, -103.77820961))
            ThreePointArc((193.586012984, -103.77820961), (192.086012984, -102.27820961), (190.586012984, -103.77820961))
        make_face()
        with BuildLine():
            Line((176.586012984, -103.77820961), (176.586012984, -108.27820961))
            ThreePointArc((176.586012984, -108.27820961), (178.086012984, -109.77820961), (179.586012984, -108.27820961))
            Line((179.586012984, -108.27820961), (179.586012984, -103.77820961))
            ThreePointArc((179.586012984, -103.77820961), (178.086012984, -102.27820961), (176.586012984, -103.77820961))
        make_face()
        with BuildLine():
            Line((198.586012984, -161.77820961), (198.586012984, -71.77820961))
            ThreePointArc((198.586012984, -71.77820961), (200.050479078, -68.242675704), (203.586012984, -66.77820961))
            Line((203.586012984, -66.77820961), (238.586012984, -66.77820961))
            Line((238.586012984, -66.77820961), (238.586012984, -166.77820961))
            Line((238.586012984, -166.77820961), (203.586012984, -166.77820961))
            ThreePointArc((203.586012984, -166.77820961), (200.050479078, -165.313743516), (198.586012984, -161.77820961))
        make_face()
    extrude(amount=-CUT_EXTRUDE_1_DEPTH, mode=Mode.SUBTRACT)

    # 圆角2
    fillet_2_edges = [part.edges().sort_by_distance(p)[0] for p in [
        (8.586012984, 3.09, 66.77820961),
    ]]
    fillet(fillet_2_edges, radius=FILLET_2_R)

    # 圆角3
    fillet_3_edges = [part.edges().sort_by_distance(p)[0] for p in [
        (8.586012984, 3.09, 166.77820961),
    ]]
    fillet(fillet_3_edges, radius=FILLET_3_R)

    # 圆角4
    fillet_4_edges = [part.edges().sort_by_distance(p)[0] for p in [
        (238.586012984, 3.09, 166.77820961),
    ]]
    fillet(fillet_4_edges, radius=FILLET_4_R)

    # 圆角5
    fillet_5_edges = [part.edges().sort_by_distance(p)[0] for p in [
        (238.586012984, 3.09, 66.77820961),
    ]]
    fillet(fillet_5_edges, radius=FILLET_5_R)

    # 草图4 → 切除-拉伸2 (cut, through all)
    with BuildSketch(Plane(origin=(0, 0, 0), x_dir=(-1, 0, 0), z_dir=(0, -1, 0))):
        with Locations((-123.586012984, -59.77820961)):
            Rectangle(SKETCH_4_W, SKETCH_4_H)
        with Locations((-123.586012984, -173.77820961)):
            Rectangle(SKETCH_4_W, SKETCH_4_H)
        with Locations((-232.113924071, -35.249657434)):
            Circle(SKETCH_4_R)
        with Locations((-200.838101897, -53.306761785)):
            Circle(SKETCH_4_R)
        with Locations((-232.113924071, -198.306761785)):
            Circle(SKETCH_4_R)
        with Locations((-200.838101897, -180.249657434)):
            Circle(SKETCH_4_R)
        with Locations((-15.058101897, -198.306761785)):
            Circle(SKETCH_4_R)
        with Locations((-46.333924071, -180.249657434)):
            Circle(SKETCH_4_R)
        with Locations((-46.333924071, -53.306761785)):
            Circle(SKETCH_4_R)
        with Locations((-15.058101897, -35.249657434)):
            Circle(SKETCH_4_R)
    extrude(amount=-CUT_EXTRUDE_2_DEPTH, mode=Mode.SUBTRACT)

    # 草图5 → 切除-拉伸9 (cut, two sides)
    with BuildSketch(Plane(origin=(0, 6.18, 0), x_dir=(1, 0, 0), z_dir=(0, 1, 0))) as cut_extrude_9_sk:
        with BuildLine():
            Line((123.586012984, -266.77820961), (23.586012984, -266.77820961))
            ThreePointArc((23.586012984, -266.77820961), (123.586012984, -186.77820961), (223.586012984, -266.77820961))
            Line((223.586012984, -266.77820961), (123.586012984, -266.77820961))
        make_face()
        with BuildLine():
            Line((23.586012984, 33.22179039), (223.586012984, 33.22179039))
            ThreePointArc((223.586012984, 33.22179039), (123.586012984, -46.77820961), (23.586012984, 33.22179039))
        make_face()
    extrude(amount=CUT_EXTRUDE_9_DEPTH, mode=Mode.SUBTRACT)
    extrude(cut_extrude_9_sk.sketch, amount=-CUT_EXTRUDE_9_DEPTH_BACK, mode=Mode.SUBTRACT)


solid = part.part
